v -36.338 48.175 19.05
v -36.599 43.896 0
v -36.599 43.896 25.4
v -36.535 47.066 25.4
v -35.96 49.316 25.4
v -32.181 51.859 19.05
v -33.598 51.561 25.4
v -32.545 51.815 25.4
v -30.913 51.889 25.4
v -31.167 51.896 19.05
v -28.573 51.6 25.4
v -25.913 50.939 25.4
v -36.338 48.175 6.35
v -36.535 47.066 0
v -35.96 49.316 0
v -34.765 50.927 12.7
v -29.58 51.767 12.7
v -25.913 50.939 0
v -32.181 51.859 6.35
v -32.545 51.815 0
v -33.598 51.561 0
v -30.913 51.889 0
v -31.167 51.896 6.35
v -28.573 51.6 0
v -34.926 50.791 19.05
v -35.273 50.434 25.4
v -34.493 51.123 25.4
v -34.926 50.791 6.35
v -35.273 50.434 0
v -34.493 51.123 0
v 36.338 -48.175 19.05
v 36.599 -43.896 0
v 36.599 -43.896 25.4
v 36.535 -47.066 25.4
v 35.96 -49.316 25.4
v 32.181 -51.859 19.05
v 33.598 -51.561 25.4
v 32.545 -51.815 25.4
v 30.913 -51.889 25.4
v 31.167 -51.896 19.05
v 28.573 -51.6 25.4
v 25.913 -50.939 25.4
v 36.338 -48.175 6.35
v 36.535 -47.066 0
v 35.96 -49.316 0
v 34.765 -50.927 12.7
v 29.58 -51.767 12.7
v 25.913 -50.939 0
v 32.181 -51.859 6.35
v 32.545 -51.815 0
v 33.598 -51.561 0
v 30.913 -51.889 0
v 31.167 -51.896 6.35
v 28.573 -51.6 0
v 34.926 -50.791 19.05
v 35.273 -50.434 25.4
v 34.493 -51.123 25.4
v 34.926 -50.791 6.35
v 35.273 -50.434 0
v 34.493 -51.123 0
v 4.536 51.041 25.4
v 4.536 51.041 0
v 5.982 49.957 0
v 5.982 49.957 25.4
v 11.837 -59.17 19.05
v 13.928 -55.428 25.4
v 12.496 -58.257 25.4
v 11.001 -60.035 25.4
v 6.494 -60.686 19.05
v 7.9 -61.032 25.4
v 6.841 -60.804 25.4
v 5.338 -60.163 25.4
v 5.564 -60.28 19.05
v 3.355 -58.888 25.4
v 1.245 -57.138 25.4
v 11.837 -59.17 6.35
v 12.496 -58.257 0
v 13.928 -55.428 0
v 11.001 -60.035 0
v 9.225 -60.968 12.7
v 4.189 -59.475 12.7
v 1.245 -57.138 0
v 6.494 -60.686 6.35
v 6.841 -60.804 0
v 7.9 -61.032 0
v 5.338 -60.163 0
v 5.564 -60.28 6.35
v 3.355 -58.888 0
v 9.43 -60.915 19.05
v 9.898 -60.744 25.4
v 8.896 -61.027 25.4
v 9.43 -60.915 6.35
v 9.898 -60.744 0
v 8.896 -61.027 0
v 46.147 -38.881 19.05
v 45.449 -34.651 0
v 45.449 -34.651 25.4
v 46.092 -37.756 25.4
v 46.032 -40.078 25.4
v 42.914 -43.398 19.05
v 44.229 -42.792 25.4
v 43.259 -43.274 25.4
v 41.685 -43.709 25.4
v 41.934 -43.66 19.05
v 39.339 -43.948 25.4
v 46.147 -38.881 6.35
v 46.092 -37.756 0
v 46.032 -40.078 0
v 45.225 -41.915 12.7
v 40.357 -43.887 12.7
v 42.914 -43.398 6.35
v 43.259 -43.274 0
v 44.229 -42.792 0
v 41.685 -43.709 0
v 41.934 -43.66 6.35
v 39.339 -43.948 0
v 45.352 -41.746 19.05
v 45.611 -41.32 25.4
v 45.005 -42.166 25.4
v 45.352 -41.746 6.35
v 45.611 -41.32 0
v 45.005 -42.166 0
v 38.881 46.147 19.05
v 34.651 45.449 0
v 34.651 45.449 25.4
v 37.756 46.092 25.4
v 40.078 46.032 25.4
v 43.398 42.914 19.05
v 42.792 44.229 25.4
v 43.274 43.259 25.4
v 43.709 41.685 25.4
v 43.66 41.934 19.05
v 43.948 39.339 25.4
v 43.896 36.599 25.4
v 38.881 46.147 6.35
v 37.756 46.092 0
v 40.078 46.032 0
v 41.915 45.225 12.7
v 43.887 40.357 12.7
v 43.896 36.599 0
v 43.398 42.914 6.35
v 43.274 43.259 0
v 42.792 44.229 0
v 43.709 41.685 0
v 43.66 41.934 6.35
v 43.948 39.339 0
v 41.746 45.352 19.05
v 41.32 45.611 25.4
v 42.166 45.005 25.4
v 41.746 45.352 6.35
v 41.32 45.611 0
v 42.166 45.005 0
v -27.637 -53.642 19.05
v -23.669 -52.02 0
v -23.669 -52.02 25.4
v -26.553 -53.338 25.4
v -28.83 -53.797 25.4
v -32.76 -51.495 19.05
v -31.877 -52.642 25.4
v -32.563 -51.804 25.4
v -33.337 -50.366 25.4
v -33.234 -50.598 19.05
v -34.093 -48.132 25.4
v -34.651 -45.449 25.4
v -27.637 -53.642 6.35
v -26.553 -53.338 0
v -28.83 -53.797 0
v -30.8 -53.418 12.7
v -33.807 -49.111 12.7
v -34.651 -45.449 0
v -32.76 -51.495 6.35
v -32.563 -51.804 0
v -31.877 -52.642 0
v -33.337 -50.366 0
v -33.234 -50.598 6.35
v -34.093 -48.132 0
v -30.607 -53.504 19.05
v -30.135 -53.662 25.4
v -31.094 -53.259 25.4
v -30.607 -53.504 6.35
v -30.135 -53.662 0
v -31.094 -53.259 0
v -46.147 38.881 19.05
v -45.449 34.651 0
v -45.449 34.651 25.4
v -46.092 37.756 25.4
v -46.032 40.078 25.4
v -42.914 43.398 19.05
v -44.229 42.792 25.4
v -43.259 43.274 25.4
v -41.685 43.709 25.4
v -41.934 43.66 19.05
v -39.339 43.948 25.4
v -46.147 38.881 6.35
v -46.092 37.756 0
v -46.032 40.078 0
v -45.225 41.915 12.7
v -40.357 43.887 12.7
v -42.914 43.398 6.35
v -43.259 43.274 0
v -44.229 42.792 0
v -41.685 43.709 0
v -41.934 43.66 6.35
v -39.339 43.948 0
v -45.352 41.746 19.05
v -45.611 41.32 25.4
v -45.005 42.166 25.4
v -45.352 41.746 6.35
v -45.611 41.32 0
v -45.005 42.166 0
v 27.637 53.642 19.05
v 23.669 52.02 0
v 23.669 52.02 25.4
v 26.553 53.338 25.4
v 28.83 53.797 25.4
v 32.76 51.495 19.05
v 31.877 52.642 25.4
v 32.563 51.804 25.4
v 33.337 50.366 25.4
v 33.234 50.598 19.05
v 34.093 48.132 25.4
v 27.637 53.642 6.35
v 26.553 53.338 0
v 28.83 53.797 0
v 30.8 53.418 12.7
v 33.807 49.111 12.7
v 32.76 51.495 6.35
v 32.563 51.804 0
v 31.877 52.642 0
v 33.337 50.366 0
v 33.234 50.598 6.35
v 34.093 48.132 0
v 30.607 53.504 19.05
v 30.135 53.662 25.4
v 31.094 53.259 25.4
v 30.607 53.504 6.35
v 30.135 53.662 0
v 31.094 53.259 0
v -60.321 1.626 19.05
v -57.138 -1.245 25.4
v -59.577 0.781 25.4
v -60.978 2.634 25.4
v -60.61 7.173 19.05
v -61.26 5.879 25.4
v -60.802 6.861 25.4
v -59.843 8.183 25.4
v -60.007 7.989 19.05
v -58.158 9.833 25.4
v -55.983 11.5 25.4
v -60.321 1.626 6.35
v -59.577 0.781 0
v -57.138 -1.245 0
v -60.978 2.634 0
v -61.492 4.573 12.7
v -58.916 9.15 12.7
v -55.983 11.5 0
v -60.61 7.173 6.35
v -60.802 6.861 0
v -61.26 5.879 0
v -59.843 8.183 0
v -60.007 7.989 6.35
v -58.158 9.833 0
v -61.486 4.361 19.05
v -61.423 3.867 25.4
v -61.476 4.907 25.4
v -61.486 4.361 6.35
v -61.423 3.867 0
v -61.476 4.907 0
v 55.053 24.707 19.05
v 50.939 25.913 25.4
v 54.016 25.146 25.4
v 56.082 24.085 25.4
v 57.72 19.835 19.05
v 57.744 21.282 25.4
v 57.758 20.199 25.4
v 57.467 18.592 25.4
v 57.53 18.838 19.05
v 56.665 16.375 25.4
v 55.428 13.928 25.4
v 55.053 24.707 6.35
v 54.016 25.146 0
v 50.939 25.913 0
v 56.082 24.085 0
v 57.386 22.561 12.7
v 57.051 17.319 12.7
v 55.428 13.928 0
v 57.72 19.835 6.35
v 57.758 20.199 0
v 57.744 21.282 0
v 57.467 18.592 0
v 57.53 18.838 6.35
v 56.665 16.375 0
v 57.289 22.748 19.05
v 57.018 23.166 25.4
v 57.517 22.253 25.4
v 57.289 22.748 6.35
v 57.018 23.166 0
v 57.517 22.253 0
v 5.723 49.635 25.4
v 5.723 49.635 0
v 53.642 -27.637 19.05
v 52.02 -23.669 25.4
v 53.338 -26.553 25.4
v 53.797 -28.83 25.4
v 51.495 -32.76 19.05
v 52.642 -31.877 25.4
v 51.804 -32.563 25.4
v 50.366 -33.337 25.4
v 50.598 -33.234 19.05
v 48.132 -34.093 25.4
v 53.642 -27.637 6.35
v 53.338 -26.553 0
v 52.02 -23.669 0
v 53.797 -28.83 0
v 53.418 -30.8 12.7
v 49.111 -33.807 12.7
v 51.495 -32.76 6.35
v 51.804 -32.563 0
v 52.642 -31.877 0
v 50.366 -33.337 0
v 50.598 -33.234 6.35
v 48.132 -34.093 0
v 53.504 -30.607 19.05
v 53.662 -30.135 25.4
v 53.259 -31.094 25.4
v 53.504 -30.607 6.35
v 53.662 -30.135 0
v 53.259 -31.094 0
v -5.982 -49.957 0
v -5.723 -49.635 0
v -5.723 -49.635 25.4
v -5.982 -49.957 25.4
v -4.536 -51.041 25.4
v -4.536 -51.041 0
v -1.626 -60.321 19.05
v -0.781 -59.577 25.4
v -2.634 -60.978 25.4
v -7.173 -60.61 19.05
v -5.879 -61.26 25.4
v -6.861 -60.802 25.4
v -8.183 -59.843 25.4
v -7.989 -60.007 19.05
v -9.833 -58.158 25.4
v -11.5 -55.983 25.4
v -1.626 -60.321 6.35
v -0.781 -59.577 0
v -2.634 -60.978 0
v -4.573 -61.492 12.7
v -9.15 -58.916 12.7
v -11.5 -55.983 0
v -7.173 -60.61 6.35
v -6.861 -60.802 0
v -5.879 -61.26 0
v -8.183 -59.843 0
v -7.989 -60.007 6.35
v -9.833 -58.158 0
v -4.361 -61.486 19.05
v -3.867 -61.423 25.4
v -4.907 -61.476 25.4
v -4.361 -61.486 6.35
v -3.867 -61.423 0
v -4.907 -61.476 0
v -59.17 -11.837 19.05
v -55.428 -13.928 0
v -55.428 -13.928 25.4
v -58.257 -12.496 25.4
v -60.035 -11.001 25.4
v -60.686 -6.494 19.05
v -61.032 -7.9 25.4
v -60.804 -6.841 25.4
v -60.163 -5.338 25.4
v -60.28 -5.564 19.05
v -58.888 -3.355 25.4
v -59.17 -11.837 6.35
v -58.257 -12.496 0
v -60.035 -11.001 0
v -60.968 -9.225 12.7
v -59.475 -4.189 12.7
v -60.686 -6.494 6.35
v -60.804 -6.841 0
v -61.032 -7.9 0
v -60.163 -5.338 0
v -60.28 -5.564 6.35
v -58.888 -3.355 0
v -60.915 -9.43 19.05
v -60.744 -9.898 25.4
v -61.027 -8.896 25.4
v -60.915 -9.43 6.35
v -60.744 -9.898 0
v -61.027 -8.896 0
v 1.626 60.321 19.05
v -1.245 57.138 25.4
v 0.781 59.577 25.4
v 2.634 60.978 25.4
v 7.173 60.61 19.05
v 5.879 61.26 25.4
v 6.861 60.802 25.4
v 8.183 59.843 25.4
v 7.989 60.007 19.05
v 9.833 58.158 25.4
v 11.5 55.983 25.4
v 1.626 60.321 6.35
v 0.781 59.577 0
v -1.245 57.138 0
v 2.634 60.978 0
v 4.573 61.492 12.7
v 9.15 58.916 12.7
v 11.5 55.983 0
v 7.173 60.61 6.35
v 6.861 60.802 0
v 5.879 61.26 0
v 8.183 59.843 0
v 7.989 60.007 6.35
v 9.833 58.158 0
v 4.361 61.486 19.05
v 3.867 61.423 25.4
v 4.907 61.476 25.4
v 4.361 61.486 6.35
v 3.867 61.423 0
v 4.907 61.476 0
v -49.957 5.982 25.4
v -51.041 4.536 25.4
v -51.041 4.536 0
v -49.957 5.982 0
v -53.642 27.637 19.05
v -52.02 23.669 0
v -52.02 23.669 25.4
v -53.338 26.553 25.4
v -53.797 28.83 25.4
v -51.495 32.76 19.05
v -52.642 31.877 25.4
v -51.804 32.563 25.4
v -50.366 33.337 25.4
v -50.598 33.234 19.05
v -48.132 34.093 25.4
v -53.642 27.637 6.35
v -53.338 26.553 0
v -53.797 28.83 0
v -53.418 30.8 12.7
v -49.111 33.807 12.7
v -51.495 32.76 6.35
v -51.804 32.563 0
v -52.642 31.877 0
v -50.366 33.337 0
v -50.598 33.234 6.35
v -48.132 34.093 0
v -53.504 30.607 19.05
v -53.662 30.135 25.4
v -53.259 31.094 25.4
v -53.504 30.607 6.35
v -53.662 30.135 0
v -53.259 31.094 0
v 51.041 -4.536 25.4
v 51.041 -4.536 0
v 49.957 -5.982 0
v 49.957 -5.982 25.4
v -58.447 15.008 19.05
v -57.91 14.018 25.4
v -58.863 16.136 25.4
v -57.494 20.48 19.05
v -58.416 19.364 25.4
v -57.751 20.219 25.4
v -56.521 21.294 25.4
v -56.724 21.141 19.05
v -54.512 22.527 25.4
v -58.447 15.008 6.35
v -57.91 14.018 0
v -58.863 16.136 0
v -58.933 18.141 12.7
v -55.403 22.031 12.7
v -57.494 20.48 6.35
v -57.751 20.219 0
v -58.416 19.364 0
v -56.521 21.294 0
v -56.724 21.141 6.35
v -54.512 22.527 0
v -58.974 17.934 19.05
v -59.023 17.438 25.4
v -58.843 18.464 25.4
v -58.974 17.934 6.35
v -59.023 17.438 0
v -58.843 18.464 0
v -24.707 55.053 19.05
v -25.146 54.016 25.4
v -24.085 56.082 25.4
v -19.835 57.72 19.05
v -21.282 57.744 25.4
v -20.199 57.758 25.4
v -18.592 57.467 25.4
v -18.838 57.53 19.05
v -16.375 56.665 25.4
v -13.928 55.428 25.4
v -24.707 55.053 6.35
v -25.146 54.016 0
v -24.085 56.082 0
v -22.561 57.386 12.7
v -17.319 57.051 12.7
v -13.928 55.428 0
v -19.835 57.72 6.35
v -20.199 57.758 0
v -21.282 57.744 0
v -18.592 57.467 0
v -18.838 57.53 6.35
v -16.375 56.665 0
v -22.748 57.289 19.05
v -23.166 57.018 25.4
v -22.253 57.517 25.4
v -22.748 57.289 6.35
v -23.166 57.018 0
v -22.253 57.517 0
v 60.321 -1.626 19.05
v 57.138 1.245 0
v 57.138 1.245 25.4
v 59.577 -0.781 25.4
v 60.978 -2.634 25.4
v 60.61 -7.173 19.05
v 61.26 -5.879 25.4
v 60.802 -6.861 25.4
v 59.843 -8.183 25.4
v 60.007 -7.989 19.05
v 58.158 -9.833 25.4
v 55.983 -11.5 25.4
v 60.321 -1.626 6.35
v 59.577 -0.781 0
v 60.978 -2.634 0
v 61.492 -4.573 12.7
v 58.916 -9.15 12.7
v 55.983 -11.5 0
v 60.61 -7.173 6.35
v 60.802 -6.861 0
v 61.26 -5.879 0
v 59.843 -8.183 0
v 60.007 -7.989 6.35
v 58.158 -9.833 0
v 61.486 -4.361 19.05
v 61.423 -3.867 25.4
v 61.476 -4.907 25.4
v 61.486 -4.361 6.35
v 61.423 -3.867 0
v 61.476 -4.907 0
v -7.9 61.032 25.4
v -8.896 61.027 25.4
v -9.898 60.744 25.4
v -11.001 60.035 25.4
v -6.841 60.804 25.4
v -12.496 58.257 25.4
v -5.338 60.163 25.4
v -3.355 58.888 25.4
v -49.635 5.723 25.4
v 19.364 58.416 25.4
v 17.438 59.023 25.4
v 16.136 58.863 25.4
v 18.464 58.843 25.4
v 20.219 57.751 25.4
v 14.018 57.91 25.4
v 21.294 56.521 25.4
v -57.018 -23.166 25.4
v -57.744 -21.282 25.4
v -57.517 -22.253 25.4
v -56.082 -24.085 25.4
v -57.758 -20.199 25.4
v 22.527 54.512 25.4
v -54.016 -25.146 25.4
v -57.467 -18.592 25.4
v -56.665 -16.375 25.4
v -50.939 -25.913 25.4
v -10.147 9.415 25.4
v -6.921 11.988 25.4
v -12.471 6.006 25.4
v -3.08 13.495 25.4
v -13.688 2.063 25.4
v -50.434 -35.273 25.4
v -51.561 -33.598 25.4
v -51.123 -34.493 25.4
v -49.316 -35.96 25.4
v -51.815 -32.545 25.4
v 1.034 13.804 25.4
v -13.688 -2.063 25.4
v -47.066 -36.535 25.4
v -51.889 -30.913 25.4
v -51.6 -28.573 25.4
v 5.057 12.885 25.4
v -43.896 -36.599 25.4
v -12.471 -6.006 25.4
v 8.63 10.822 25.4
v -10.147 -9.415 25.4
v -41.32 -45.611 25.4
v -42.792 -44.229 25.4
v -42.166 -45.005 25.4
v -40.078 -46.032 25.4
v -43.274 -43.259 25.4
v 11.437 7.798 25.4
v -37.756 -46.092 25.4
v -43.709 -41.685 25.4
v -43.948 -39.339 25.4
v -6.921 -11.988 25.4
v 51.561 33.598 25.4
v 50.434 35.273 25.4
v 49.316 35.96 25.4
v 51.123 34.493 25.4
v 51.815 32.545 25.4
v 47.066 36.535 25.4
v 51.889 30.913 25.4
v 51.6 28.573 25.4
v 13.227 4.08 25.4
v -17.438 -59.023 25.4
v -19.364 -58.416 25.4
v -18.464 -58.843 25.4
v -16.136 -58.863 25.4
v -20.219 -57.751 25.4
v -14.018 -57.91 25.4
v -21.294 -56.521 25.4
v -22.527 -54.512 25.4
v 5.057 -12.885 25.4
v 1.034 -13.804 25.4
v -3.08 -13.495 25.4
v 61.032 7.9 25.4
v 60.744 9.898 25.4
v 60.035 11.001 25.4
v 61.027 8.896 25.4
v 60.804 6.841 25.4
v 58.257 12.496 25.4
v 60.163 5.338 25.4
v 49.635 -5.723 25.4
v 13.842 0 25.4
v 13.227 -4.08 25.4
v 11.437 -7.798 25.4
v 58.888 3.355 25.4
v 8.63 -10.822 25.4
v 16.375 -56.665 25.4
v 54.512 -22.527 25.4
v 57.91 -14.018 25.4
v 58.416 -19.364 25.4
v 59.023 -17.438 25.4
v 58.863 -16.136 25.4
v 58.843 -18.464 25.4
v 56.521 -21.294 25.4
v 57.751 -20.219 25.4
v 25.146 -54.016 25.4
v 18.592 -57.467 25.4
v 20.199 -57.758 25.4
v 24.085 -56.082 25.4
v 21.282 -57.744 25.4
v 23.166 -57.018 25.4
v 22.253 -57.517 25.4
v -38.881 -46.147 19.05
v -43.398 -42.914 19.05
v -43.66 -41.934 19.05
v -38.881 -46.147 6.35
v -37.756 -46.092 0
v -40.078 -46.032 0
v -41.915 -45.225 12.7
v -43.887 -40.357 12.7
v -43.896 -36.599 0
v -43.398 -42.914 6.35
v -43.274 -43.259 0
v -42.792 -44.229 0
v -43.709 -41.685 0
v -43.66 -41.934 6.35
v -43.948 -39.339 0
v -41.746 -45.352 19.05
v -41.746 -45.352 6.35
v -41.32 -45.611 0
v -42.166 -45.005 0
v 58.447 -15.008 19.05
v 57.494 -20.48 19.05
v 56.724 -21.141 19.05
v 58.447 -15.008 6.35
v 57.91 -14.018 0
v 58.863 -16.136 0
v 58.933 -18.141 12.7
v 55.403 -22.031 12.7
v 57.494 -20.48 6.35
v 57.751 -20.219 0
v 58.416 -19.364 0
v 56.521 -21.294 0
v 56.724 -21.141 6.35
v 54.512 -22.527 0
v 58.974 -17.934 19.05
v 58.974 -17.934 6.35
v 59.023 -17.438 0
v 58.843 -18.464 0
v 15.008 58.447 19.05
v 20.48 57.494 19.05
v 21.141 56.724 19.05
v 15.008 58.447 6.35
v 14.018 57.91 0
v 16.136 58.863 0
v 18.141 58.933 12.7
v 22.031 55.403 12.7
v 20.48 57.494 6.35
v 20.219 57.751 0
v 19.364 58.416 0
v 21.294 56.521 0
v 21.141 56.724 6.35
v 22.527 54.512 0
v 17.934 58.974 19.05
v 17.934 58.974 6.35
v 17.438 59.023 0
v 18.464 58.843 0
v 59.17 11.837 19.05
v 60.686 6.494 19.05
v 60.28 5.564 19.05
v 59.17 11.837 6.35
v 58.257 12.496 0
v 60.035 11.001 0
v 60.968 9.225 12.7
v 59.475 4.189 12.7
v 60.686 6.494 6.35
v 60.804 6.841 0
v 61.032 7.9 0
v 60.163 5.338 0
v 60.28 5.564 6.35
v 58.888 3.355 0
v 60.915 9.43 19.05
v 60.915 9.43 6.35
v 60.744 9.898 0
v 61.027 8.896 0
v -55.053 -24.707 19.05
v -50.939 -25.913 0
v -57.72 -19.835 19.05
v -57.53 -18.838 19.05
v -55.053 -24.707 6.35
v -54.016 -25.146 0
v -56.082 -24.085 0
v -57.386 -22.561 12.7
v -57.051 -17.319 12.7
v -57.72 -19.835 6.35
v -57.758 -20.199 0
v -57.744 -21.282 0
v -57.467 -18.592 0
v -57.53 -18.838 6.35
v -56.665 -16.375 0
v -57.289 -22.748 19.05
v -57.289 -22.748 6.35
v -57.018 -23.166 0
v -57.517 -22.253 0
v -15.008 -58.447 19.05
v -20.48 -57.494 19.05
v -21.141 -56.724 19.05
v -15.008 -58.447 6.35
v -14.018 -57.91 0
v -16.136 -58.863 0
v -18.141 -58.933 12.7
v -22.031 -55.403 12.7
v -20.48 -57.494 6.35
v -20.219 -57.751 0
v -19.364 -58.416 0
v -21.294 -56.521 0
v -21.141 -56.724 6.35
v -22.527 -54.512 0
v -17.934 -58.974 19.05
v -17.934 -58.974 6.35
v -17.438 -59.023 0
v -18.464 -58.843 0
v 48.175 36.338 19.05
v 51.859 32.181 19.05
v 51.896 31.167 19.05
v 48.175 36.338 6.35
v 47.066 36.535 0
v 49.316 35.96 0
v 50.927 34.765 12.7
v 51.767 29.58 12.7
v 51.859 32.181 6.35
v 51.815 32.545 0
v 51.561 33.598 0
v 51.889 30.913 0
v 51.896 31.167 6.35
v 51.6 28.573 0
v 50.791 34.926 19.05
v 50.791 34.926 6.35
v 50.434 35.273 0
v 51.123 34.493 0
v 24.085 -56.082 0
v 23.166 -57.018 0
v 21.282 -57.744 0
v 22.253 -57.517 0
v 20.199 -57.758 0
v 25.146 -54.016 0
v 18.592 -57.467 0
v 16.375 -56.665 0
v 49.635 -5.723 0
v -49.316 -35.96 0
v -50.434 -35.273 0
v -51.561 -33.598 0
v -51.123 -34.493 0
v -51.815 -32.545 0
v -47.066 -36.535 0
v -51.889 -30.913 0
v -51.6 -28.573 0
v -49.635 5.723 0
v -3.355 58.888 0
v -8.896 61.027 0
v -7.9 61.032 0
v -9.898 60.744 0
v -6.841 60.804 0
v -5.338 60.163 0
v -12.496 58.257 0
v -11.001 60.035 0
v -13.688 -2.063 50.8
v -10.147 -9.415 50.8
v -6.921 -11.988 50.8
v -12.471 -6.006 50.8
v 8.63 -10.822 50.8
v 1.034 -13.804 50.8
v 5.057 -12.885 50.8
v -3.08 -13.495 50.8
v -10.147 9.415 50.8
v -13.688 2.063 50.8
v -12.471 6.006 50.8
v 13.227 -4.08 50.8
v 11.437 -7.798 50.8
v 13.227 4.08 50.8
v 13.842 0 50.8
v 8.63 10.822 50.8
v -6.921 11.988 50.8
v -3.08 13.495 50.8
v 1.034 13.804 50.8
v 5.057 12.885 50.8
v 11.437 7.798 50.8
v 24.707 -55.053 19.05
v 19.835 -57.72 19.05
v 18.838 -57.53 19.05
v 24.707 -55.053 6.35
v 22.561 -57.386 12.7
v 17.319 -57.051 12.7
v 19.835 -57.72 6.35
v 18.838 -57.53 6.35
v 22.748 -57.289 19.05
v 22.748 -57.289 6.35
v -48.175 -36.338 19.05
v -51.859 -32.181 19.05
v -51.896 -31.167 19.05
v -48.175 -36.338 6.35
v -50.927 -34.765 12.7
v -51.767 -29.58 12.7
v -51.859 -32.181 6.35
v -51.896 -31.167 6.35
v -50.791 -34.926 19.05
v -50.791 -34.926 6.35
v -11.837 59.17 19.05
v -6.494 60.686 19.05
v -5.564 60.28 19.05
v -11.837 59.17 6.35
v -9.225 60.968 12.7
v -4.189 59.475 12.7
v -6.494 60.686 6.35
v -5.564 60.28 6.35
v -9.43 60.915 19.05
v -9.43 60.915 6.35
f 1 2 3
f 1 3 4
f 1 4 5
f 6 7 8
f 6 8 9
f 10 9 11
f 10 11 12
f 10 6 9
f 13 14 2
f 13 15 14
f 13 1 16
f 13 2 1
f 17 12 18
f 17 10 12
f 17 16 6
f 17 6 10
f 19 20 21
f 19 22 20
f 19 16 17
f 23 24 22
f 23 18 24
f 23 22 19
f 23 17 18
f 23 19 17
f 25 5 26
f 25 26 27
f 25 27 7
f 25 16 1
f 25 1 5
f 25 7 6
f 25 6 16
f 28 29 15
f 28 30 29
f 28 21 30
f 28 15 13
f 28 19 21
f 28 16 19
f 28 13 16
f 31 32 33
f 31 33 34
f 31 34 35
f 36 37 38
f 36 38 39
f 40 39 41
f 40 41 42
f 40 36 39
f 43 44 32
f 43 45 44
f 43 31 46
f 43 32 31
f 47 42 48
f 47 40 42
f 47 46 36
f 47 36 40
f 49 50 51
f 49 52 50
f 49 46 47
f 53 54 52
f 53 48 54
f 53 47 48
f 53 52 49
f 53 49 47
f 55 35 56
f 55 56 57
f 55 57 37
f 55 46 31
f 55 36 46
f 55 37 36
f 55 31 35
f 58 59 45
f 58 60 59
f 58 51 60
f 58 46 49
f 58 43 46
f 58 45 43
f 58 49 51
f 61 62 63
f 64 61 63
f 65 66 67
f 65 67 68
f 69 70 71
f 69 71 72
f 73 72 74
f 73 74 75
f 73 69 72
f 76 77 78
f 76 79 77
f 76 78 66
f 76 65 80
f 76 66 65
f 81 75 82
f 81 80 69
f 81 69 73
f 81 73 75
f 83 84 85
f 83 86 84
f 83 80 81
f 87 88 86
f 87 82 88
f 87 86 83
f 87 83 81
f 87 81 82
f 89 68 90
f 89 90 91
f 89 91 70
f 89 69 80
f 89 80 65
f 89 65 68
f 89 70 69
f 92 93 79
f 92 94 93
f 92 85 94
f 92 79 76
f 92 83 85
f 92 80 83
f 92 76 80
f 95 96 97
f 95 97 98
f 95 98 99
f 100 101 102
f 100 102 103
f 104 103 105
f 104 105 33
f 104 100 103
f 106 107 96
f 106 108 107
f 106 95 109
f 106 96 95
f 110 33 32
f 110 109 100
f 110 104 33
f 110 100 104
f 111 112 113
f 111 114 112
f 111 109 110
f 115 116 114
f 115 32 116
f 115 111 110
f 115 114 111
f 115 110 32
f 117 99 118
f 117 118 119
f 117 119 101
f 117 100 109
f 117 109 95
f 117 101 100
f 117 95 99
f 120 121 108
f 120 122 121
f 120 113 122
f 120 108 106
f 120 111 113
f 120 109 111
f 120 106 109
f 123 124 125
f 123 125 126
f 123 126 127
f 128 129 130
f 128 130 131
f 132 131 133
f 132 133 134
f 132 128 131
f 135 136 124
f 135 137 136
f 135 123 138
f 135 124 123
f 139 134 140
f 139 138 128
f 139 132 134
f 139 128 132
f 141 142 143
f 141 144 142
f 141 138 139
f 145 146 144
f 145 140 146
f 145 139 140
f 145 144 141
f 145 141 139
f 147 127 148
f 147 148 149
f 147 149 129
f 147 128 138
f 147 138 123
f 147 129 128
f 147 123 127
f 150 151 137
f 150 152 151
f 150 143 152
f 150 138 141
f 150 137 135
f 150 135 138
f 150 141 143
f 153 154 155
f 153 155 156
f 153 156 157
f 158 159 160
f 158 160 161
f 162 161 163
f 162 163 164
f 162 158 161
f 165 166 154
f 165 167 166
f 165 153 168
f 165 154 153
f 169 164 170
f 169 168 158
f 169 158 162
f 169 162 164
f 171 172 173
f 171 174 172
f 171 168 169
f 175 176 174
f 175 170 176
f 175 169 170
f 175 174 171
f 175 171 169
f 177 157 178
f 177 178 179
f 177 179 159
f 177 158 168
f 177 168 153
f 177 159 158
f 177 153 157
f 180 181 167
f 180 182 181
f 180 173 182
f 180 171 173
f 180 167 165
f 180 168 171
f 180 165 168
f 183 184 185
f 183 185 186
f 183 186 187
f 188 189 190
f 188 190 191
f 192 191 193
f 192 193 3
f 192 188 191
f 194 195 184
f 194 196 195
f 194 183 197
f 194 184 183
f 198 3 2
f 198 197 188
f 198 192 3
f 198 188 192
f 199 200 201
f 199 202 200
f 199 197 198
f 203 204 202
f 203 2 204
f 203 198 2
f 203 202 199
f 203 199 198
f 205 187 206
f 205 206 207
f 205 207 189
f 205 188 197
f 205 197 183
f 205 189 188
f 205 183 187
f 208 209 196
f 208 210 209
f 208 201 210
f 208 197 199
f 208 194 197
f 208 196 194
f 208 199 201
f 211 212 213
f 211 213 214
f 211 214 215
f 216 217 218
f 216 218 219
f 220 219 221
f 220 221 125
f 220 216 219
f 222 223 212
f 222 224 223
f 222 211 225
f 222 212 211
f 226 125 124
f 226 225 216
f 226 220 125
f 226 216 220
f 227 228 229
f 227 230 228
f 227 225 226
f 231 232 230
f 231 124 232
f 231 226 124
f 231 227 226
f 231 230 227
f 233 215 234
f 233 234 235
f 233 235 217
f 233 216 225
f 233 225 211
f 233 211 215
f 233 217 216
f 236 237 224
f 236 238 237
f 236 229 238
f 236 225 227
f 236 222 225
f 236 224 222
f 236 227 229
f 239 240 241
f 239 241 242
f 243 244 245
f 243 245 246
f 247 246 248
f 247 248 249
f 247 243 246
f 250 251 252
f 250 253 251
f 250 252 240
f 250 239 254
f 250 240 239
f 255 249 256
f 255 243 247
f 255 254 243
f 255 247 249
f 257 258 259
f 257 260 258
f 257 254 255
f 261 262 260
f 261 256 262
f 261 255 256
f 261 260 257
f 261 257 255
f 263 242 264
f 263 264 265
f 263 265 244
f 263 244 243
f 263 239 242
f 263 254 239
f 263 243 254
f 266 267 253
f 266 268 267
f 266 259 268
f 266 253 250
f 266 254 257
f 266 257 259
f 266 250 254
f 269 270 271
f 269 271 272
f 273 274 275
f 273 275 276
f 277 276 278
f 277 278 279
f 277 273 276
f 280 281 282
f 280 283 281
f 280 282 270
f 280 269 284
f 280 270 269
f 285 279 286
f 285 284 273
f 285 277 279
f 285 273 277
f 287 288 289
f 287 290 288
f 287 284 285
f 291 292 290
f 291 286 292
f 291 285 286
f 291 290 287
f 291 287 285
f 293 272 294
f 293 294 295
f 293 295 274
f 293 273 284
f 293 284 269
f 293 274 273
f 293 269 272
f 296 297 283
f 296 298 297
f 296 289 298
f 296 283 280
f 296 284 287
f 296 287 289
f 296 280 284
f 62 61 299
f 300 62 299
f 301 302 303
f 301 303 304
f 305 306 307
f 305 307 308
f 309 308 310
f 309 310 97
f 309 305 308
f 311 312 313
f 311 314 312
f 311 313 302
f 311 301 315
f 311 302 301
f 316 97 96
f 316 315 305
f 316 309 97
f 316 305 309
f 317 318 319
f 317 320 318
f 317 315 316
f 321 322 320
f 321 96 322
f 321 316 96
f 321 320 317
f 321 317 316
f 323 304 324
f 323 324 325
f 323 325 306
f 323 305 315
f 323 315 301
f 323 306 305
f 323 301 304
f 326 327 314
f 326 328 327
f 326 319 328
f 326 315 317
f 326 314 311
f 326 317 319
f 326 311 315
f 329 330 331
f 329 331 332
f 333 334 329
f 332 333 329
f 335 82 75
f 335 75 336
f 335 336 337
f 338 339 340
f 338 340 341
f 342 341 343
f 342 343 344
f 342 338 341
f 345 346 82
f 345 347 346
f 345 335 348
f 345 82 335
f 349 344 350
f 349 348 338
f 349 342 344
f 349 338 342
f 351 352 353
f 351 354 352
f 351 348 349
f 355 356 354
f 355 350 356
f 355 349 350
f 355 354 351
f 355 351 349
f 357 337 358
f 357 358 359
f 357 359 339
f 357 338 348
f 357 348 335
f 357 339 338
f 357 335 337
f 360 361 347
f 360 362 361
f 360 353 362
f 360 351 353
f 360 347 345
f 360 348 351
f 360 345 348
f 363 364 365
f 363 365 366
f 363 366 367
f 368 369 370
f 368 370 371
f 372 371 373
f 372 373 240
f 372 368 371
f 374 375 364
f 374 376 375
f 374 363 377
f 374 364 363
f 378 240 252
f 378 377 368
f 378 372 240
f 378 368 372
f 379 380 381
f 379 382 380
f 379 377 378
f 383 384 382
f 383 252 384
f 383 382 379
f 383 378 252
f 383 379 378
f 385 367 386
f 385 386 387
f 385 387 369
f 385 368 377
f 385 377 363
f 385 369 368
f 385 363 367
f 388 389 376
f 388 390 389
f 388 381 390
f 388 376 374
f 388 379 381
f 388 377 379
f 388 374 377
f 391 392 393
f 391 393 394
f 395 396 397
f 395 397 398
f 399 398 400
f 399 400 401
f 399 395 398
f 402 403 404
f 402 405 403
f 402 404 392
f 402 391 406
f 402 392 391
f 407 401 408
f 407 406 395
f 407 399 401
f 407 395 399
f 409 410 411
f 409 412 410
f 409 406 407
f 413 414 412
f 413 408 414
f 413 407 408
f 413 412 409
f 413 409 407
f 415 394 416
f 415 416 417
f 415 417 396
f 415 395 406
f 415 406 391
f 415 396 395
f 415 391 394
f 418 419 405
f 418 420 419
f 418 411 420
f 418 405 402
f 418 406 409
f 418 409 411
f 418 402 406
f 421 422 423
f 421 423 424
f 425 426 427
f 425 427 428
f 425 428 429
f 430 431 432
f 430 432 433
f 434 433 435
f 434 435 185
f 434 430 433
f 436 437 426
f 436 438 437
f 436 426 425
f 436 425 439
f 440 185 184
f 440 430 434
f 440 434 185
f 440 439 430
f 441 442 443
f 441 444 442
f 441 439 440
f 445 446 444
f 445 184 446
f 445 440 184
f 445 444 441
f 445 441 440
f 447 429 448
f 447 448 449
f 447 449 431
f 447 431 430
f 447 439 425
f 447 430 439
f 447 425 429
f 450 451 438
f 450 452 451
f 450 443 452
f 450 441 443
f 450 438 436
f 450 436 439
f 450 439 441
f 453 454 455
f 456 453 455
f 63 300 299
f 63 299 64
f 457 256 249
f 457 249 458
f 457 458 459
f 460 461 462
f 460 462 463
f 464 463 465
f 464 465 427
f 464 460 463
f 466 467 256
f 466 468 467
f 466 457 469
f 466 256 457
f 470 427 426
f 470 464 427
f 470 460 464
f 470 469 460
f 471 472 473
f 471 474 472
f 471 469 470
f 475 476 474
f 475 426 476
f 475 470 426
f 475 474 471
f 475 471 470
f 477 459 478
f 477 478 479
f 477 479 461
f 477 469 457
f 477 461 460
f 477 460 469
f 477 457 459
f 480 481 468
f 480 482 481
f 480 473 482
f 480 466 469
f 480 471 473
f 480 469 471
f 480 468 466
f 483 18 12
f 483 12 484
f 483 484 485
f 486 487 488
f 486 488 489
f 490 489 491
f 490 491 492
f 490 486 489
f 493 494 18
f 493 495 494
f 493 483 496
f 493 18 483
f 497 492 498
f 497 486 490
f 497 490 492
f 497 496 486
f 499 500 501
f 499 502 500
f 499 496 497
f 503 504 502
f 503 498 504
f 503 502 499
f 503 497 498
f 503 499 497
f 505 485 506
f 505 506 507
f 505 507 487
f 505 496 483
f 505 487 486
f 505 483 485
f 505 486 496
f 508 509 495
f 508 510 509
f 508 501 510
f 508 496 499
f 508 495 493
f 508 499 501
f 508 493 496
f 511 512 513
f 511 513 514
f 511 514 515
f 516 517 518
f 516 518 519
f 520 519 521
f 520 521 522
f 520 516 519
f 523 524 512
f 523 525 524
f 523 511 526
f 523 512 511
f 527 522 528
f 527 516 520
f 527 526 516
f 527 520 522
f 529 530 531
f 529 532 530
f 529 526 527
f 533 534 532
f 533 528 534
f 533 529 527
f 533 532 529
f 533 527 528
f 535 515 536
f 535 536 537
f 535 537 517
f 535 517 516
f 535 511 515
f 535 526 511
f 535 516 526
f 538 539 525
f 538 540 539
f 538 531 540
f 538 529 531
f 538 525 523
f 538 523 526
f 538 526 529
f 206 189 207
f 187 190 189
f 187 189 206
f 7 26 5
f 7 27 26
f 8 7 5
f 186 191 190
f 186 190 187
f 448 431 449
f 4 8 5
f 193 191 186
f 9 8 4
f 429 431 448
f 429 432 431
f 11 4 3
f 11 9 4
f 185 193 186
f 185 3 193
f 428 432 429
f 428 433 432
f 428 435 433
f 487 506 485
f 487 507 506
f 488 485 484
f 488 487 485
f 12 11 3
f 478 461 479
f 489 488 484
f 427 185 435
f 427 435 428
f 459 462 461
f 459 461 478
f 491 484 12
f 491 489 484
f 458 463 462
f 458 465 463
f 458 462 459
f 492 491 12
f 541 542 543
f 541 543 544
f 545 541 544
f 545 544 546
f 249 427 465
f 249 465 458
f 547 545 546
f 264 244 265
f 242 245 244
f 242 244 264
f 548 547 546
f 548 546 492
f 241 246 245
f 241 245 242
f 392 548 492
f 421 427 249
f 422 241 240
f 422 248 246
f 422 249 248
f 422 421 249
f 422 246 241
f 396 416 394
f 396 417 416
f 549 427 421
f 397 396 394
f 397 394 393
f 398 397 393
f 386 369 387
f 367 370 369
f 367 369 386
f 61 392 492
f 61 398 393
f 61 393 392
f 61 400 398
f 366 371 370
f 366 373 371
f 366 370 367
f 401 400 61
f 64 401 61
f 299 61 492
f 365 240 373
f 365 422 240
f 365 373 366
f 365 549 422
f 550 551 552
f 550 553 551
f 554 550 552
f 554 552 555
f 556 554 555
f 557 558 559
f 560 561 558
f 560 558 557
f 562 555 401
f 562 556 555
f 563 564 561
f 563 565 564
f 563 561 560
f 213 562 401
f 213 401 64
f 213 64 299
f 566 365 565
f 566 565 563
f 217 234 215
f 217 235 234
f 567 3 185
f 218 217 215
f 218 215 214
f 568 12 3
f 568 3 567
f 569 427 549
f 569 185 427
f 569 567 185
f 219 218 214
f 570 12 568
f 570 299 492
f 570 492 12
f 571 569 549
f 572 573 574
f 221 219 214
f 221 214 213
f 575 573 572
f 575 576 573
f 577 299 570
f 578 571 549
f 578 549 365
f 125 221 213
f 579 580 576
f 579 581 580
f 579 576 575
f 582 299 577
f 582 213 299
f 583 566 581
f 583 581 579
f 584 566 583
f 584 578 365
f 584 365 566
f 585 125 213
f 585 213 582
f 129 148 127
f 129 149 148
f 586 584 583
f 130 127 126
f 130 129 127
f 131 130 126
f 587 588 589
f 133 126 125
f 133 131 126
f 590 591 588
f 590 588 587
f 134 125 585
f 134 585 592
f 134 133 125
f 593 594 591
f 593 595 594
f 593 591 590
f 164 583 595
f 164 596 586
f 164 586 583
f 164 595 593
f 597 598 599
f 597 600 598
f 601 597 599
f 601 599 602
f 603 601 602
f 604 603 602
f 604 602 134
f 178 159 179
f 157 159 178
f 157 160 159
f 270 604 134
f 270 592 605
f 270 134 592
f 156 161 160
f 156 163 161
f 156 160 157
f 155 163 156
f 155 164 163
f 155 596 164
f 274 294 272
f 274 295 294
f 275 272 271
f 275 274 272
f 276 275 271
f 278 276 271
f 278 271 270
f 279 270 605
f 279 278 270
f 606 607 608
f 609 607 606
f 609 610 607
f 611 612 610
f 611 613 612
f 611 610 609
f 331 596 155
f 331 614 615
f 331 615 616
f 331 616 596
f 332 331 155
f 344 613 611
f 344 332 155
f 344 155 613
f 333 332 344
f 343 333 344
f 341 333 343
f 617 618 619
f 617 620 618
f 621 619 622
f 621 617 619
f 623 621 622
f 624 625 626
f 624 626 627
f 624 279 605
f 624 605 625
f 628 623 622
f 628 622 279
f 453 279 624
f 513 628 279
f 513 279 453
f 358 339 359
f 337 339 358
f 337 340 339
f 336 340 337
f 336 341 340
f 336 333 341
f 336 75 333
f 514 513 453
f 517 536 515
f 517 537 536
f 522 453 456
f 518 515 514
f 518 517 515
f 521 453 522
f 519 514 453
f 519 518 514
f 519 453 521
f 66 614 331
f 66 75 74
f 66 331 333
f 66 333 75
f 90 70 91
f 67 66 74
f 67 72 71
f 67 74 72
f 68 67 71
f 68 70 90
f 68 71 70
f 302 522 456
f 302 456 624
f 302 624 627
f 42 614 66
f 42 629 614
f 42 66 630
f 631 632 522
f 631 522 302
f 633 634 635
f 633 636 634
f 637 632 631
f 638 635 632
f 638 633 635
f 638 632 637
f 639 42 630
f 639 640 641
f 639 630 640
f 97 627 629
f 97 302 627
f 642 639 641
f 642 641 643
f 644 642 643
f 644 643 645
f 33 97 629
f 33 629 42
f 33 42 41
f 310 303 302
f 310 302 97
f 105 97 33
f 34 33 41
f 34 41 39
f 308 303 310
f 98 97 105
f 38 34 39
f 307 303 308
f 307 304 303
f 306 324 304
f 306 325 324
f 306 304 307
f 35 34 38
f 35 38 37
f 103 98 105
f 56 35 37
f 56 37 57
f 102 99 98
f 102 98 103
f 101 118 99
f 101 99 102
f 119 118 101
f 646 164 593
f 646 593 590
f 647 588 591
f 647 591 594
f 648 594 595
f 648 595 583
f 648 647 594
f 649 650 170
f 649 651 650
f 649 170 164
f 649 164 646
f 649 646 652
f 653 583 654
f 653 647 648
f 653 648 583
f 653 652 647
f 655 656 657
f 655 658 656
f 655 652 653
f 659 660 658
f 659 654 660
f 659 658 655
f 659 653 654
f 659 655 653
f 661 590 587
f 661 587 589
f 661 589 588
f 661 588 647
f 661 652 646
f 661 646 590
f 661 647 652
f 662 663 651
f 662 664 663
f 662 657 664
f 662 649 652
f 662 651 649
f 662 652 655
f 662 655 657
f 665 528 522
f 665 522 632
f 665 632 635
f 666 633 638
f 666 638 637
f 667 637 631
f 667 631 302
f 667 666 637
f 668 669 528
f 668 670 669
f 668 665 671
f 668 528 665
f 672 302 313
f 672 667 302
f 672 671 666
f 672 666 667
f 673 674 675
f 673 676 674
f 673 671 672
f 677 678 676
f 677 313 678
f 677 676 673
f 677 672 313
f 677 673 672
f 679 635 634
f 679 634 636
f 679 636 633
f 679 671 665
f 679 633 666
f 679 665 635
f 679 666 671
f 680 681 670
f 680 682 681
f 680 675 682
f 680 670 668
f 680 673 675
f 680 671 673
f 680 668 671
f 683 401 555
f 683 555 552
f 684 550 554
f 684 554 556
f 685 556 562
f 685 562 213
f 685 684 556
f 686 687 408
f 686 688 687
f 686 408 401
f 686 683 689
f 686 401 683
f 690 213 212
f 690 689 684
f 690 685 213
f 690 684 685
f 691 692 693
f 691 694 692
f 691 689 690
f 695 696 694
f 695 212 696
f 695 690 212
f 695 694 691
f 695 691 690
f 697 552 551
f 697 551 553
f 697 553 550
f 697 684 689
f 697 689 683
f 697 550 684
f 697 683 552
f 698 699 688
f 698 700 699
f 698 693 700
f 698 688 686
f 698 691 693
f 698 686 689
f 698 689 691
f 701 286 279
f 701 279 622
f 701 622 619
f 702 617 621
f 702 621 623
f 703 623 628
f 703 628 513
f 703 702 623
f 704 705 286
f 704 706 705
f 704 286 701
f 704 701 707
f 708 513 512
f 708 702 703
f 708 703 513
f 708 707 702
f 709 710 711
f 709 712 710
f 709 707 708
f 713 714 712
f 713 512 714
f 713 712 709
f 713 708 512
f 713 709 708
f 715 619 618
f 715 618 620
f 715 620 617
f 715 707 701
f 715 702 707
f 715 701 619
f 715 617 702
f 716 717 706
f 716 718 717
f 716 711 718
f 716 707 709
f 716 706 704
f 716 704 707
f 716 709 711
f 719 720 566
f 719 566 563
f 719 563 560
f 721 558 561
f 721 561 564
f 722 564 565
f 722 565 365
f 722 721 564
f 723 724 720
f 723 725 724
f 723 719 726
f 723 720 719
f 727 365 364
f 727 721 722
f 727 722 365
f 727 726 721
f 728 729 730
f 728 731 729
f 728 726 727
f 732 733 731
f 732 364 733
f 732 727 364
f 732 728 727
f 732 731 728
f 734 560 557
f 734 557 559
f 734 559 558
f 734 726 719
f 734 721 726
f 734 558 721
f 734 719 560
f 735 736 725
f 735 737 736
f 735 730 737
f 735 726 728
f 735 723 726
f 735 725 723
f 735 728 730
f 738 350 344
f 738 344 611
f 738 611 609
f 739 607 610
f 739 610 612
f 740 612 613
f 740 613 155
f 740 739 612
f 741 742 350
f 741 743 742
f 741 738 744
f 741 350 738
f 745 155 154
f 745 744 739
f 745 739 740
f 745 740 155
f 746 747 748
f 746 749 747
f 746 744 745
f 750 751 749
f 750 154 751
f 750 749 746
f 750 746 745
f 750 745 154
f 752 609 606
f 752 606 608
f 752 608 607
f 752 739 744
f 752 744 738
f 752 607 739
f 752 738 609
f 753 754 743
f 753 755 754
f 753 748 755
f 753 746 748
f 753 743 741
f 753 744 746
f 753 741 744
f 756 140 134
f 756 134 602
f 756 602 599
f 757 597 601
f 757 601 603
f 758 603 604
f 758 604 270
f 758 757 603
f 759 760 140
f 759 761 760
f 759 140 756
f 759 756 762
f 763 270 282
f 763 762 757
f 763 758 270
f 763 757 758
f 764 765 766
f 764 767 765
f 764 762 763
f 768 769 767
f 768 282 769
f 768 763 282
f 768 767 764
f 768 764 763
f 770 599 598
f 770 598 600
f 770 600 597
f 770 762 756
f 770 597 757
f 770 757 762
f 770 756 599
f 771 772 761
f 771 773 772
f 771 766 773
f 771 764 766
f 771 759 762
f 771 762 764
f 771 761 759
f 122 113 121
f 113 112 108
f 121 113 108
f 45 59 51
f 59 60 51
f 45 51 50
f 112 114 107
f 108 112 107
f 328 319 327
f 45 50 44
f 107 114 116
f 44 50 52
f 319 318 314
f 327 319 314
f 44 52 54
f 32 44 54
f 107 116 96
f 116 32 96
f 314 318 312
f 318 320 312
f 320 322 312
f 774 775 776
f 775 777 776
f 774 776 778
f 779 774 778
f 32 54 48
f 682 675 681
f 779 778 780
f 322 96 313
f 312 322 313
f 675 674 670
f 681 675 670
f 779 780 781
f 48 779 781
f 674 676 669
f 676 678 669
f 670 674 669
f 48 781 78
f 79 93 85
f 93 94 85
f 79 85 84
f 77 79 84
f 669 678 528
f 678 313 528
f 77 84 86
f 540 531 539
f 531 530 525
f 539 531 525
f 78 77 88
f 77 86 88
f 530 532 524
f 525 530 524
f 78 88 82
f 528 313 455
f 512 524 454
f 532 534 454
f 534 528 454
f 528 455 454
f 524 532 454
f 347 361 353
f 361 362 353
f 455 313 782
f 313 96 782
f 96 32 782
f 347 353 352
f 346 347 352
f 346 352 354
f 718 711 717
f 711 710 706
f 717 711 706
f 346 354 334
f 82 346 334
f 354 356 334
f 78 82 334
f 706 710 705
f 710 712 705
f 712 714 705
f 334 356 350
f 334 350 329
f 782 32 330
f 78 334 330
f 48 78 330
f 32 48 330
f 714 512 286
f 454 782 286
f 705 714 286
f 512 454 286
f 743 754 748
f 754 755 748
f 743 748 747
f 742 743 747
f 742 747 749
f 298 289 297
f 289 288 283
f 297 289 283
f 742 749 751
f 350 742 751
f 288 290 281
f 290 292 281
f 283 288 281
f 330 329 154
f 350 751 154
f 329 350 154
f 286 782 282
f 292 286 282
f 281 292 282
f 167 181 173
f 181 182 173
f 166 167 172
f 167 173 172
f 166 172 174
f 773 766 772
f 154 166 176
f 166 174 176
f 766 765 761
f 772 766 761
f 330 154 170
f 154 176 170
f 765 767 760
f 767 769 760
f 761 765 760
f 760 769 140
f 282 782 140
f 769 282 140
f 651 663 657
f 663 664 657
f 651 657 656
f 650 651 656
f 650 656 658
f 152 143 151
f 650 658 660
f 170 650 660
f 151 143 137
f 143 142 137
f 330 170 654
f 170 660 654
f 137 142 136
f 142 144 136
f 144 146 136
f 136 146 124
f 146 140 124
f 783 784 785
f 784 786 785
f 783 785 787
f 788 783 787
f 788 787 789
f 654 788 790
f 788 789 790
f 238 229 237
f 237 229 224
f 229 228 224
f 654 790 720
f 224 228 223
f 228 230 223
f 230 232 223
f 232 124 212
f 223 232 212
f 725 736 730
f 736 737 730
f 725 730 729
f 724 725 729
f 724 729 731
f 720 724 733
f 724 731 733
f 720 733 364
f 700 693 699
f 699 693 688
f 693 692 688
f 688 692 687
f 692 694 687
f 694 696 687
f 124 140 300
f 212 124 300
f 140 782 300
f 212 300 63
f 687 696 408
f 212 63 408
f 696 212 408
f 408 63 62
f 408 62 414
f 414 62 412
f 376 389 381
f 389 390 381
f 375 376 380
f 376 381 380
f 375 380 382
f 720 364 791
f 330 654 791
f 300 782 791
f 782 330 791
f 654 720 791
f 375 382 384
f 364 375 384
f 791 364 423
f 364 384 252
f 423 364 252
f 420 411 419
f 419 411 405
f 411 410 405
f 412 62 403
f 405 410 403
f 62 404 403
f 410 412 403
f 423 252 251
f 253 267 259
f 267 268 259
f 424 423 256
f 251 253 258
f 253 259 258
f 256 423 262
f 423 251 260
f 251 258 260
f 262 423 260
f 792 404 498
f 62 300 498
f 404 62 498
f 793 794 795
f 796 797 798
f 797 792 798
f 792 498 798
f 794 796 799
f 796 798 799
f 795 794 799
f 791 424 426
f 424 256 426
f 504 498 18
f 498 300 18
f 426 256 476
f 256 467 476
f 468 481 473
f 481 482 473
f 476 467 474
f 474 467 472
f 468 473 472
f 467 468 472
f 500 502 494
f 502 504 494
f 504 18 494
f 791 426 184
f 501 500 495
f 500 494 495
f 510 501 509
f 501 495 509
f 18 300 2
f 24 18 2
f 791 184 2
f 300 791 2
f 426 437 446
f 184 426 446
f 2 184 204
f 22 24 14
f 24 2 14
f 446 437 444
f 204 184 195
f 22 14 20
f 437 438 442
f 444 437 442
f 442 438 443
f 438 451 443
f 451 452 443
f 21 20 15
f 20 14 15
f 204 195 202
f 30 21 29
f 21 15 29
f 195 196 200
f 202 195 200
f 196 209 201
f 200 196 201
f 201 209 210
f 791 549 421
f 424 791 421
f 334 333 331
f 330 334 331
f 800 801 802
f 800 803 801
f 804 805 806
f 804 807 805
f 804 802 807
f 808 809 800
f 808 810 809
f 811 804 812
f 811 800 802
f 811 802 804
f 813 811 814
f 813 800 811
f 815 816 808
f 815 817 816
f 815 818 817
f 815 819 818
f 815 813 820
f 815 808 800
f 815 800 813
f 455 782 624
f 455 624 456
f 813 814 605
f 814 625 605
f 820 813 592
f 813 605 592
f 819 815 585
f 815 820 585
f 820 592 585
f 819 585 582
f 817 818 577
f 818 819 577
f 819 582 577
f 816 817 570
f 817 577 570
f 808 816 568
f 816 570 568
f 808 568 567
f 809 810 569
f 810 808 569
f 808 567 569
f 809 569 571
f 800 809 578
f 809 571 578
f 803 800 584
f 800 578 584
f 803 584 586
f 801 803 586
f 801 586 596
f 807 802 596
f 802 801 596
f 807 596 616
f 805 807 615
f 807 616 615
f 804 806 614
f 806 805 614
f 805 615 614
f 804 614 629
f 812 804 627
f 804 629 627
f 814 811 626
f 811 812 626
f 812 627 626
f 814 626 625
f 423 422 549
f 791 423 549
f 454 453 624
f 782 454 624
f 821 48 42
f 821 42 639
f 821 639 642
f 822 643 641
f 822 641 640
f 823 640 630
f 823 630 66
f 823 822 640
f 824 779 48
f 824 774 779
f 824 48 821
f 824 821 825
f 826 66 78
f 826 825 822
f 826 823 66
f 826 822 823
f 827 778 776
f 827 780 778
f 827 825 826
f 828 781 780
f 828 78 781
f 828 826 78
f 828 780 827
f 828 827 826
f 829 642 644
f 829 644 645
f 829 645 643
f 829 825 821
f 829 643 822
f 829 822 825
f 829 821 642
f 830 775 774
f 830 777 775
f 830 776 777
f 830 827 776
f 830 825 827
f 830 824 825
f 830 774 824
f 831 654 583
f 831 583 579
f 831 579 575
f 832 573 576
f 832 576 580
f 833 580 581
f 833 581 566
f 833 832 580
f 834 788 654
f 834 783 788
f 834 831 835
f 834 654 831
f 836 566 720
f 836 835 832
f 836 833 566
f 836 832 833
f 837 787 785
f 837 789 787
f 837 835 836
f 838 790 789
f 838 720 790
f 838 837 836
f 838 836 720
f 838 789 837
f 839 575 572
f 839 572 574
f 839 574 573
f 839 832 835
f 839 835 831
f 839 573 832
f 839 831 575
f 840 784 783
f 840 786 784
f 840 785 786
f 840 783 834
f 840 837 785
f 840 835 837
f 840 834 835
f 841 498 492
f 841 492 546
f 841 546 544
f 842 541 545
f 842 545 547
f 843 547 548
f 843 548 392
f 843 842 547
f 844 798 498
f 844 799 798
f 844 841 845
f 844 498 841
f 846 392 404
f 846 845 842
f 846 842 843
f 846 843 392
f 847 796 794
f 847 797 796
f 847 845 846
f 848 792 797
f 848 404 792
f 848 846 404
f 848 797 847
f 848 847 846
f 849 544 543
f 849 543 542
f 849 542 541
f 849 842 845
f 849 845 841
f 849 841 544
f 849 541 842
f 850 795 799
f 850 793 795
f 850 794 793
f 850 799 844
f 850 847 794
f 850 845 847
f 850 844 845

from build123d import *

# Parameters (mm, degrees)
F1_DEPTH = 25.4
F2_COUNT = 7
F3_R     = 5.08
F5_DEPTH = 25.4
F6_R     = 13.8422329742
F7_DEPTH = 25.4
F8_COUNT = 4


with BuildPart() as f1:
    # F0 (on Top) → F1 (new body)
    with BuildSketch(Plane.XY):
        with BuildLine():
            ThreePointArc((-0.3036099023, 41.7036828128), (-29.3821999901, -29.5968860332), (41.704787964, 0))
            ThreePointArc((41.704787964, 0), (38.5508515564, 15.909782632), (29.5660770028, 29.4132016242))
            ThreePointArc((29.5660770028, 29.4132016242), (15.869372299, 38.5675039633), (-0.3036099023, 41.7036828128))
        make_face()
        with BuildLine():
            ThreePointArc((-0.3036099023, 41.7036828128), (15.869372299, 38.5675039633), (29.5660770028, 29.4132016242))
            add(Edge.make_bspline(
                [(-0.3036099023, 41.7036828128), (6.4916545945, 50.8782567936), (20.9015792408, 70.3101588182), (26.5683495721, 43.5511495821), (29.5660770028, 29.4132016242)],
                knots=[0, 0, 0, 0, 0.4717280628, 1, 1, 1, 1], degree=3))
        make_face()
    extrude(amount=F1_DEPTH)

    # F2: F1 ×7 about axis
    f2_axis = Axis((0, 0, 25.4), (0, 0, -1))


with BuildPart() as f1_1:
    add(f1.part)
    for i in range(1, F2_COUNT):
        add(f1.part.rotate(f2_axis, i * 360 / F2_COUNT))

    # F3
    f3_edges = [f1_1.edges().sort_by_distance(p)[0] for p in [
        (-0.30361, 41.703683, 12.7),
    ]]
    fillet(f3_edges, radius=F3_R)

    # F4 (on face) → F5 (cut)
    with BuildSketch(Plane.XY.offset(25.4)):
        with BuildLine():
            add(Edge.make_bspline(
                [(-36.3872498274, -6.7111928947), (-41.8735206701, -9.5542377544), (-62.7340181989, 2.2079607061), (-29.4439624143, 18.5836450682), (-31.0447006553, -3.9426261585), (-36.3872498274, -6.7111928947)],
                knots=[0, 0, 0, 0, 0.3333906433, 0.6753430597, 1, 1, 1, 1], degree=3))
        make_face()
    extrude(amount=-F5_DEPTH, mode=Mode.SUBTRACT)

    # F6 (on face) → F7 (join)
    with BuildSketch(Plane.XY.offset(25.4)):
        Circle(F6_R)
    extrude(amount=F7_DEPTH)

    # F8: F1 ×4 about axis
    f8_axis = Axis((0, 0, 50.8), (0, 0, 1))


with BuildPart() as f1_2:
    add(f1_1.part)
    for i in range(1, F8_COUNT):
        add(f1_1.part.rotate(f8_axis, i * 360 / F8_COUNT))


solid = f1_2.part
